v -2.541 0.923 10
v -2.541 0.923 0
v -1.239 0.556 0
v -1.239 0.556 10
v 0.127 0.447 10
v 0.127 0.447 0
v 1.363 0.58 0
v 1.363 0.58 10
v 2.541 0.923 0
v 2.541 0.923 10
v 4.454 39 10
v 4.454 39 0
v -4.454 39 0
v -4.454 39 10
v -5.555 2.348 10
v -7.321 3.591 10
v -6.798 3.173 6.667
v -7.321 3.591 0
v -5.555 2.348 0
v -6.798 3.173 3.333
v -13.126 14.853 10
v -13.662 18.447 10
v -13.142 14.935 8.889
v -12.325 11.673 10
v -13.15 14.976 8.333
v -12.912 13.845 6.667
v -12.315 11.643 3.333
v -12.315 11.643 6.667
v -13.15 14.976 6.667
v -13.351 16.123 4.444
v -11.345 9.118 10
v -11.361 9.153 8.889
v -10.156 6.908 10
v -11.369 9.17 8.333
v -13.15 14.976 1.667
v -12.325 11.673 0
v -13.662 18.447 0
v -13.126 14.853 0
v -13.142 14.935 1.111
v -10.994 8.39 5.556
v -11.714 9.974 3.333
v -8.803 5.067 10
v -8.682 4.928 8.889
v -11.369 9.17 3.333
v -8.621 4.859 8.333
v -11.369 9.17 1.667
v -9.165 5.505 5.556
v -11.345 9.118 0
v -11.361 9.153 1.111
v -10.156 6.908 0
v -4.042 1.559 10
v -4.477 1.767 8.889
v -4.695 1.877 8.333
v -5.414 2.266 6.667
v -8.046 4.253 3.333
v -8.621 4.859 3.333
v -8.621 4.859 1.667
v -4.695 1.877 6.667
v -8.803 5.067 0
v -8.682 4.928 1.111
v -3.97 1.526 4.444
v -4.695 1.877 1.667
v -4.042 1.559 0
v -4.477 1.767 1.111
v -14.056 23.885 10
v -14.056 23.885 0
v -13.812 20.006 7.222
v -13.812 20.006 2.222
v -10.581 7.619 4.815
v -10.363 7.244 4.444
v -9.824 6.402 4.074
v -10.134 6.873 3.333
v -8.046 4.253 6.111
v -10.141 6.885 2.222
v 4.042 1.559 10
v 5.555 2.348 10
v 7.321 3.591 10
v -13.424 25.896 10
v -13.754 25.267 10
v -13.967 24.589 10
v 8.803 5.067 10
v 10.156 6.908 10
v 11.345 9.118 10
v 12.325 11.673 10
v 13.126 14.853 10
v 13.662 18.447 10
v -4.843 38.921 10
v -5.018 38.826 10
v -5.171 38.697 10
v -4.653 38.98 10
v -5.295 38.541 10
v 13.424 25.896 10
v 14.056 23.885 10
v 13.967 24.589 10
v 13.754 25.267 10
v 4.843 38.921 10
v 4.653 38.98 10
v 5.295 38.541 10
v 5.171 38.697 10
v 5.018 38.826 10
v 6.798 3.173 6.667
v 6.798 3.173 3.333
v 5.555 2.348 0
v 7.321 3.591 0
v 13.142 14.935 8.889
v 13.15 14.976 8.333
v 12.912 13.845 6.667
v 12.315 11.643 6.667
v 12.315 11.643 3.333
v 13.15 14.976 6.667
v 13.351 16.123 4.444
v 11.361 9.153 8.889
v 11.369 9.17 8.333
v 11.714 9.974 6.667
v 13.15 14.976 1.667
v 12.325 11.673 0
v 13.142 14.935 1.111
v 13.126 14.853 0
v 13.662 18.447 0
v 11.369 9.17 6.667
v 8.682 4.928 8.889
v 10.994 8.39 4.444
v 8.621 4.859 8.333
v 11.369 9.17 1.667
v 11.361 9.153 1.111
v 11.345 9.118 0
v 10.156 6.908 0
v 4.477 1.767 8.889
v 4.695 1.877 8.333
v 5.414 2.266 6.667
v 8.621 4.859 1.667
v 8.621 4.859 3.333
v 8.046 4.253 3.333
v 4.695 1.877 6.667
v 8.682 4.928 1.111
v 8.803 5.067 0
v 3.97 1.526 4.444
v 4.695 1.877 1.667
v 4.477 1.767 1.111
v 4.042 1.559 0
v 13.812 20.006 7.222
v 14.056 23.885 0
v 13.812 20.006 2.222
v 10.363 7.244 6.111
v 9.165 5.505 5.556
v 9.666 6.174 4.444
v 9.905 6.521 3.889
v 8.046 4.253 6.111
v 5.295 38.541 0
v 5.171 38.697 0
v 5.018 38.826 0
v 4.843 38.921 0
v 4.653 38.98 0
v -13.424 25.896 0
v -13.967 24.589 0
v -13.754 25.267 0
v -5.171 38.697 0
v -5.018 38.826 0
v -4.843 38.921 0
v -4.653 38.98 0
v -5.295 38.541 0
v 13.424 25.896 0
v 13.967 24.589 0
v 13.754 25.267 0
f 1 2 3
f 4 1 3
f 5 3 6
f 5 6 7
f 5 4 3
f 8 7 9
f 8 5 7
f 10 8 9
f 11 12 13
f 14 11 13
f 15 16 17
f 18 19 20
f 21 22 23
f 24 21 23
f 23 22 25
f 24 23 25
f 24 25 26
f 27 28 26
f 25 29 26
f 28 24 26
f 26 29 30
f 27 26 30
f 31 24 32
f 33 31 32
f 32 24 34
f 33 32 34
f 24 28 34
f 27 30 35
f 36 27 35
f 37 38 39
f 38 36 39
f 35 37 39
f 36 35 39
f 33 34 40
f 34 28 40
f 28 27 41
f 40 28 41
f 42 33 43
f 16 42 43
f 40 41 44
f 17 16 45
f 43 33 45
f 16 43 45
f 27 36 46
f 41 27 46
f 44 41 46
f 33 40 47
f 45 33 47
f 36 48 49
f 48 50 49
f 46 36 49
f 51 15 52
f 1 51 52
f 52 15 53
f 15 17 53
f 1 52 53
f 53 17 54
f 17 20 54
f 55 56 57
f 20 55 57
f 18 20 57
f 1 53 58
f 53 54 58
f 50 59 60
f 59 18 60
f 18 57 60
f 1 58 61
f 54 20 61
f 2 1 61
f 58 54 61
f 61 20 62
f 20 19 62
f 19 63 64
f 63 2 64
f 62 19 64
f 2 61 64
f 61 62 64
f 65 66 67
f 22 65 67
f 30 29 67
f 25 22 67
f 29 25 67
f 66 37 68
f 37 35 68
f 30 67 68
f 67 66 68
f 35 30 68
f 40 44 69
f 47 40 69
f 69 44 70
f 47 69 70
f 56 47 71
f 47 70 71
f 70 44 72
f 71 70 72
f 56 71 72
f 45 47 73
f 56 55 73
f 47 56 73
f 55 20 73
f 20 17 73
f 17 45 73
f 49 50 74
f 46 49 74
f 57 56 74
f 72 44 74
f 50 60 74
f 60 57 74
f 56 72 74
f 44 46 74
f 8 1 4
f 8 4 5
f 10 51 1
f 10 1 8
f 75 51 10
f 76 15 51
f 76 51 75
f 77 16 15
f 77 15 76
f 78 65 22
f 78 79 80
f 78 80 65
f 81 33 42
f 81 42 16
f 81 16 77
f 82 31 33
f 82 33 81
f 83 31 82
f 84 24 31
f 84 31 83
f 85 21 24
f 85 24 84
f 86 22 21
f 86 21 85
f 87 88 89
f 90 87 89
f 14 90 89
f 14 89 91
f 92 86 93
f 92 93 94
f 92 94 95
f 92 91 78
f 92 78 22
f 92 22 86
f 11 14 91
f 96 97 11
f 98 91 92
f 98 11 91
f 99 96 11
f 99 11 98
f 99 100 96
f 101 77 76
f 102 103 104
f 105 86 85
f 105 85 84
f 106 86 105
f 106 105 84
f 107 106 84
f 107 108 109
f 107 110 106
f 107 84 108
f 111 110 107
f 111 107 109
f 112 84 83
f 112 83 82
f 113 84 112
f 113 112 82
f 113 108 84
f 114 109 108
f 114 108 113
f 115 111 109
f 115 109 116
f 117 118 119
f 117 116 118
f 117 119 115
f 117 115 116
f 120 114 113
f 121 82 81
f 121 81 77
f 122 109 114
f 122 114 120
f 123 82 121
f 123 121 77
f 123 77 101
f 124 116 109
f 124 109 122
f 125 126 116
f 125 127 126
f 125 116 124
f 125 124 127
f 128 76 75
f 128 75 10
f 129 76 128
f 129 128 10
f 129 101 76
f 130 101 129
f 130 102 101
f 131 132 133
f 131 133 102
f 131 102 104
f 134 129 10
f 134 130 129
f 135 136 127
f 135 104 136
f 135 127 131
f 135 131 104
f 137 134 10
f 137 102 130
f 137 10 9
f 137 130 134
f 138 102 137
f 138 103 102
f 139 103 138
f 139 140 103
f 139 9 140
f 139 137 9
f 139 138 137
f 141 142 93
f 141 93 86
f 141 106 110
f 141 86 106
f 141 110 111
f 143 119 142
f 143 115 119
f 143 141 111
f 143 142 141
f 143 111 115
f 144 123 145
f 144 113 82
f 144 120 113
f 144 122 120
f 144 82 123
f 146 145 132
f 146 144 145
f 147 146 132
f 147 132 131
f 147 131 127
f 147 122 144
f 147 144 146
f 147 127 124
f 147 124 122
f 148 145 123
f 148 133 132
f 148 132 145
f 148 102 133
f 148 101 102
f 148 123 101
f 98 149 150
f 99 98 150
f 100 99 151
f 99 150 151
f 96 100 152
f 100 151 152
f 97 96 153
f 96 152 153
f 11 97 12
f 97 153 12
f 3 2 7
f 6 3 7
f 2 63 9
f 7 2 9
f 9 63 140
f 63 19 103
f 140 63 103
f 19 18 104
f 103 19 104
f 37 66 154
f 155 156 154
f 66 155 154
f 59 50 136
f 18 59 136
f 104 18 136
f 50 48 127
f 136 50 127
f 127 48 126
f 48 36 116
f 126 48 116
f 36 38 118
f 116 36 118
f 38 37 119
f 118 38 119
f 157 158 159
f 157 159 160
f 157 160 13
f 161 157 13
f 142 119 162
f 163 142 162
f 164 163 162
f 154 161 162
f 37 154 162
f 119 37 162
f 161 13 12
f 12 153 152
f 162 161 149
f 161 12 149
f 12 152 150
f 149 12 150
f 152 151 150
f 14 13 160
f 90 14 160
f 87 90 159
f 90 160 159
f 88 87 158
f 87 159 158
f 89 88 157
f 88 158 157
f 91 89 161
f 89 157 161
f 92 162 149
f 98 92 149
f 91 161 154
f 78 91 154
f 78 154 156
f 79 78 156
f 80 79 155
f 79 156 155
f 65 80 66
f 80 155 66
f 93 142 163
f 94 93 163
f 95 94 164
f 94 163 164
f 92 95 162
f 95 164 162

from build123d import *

# Parameters (mm, degrees)
F1_DEPTH = 10
F2_R     = 7


with BuildPart() as f1:
    # F0 (on Top) → F1 (new body)
    with BuildSketch(Plane.XY):
        with BuildLine():
            Line((-5.2952272627, 38.5407575913), (-13.4240464083, 25.8959278094))
            ThreePointArc((-13.4240464083, 25.8959278094), (-13.8750817001, 24.9329216495), (-14.0564356508, 23.8851027514))
            add(Edge.make_bspline(
                [(-14.0564356508, 23.8851027514), (-13.8623993356, 19.7947937773), (-13.2387703053, 11.566177165), (-7.8025218047, 2.478450576), (-1.7911023938, 0.6541447849), (0, 0)],
                knots=[0, 0, 0, 0, 0.3727156088, 0.7096918573, 1, 1, 1, 1], degree=3))
            add(Edge.make_bspline(
                [(14.0564356508, 23.8851027514), (13.8623993356, 19.7947937773), (13.2387703053, 11.566177165), (7.8025218047, 2.478450576), (1.7911023938, 0.6541447849), (0, 0)],
                knots=[0, 0, 0, 0, 0.3727156088, 0.7096918573, 1, 1, 1, 1], degree=3))
            ThreePointArc((14.0564356508, 23.8851027514), (13.8750817001, 24.9329216495), (13.4240464083, 25.8959278094))
            Line((13.4240464083, 25.8959278094), (5.2952272627, 38.5407575913))
            ThreePointArc((5.2952272627, 38.5407575913), (4.9332368552, 38.8777122511), (4.4540487874, 39))
            Line((4.4540487874, 39), (-4.4540487874, 39))
            ThreePointArc((-4.4540487874, 39), (-4.9332368552, 38.8777122511), (-5.2952272627, 38.5407575913))
        make_face()
    extrude(amount=F1_DEPTH)

    # F2
    f2_edges = [f1.edges().sort_by_distance(p)[0] for p in [
        (0, 0, 5),
    ]]
    fillet(f2_edges, radius=F2_R)


solid = f1.part
